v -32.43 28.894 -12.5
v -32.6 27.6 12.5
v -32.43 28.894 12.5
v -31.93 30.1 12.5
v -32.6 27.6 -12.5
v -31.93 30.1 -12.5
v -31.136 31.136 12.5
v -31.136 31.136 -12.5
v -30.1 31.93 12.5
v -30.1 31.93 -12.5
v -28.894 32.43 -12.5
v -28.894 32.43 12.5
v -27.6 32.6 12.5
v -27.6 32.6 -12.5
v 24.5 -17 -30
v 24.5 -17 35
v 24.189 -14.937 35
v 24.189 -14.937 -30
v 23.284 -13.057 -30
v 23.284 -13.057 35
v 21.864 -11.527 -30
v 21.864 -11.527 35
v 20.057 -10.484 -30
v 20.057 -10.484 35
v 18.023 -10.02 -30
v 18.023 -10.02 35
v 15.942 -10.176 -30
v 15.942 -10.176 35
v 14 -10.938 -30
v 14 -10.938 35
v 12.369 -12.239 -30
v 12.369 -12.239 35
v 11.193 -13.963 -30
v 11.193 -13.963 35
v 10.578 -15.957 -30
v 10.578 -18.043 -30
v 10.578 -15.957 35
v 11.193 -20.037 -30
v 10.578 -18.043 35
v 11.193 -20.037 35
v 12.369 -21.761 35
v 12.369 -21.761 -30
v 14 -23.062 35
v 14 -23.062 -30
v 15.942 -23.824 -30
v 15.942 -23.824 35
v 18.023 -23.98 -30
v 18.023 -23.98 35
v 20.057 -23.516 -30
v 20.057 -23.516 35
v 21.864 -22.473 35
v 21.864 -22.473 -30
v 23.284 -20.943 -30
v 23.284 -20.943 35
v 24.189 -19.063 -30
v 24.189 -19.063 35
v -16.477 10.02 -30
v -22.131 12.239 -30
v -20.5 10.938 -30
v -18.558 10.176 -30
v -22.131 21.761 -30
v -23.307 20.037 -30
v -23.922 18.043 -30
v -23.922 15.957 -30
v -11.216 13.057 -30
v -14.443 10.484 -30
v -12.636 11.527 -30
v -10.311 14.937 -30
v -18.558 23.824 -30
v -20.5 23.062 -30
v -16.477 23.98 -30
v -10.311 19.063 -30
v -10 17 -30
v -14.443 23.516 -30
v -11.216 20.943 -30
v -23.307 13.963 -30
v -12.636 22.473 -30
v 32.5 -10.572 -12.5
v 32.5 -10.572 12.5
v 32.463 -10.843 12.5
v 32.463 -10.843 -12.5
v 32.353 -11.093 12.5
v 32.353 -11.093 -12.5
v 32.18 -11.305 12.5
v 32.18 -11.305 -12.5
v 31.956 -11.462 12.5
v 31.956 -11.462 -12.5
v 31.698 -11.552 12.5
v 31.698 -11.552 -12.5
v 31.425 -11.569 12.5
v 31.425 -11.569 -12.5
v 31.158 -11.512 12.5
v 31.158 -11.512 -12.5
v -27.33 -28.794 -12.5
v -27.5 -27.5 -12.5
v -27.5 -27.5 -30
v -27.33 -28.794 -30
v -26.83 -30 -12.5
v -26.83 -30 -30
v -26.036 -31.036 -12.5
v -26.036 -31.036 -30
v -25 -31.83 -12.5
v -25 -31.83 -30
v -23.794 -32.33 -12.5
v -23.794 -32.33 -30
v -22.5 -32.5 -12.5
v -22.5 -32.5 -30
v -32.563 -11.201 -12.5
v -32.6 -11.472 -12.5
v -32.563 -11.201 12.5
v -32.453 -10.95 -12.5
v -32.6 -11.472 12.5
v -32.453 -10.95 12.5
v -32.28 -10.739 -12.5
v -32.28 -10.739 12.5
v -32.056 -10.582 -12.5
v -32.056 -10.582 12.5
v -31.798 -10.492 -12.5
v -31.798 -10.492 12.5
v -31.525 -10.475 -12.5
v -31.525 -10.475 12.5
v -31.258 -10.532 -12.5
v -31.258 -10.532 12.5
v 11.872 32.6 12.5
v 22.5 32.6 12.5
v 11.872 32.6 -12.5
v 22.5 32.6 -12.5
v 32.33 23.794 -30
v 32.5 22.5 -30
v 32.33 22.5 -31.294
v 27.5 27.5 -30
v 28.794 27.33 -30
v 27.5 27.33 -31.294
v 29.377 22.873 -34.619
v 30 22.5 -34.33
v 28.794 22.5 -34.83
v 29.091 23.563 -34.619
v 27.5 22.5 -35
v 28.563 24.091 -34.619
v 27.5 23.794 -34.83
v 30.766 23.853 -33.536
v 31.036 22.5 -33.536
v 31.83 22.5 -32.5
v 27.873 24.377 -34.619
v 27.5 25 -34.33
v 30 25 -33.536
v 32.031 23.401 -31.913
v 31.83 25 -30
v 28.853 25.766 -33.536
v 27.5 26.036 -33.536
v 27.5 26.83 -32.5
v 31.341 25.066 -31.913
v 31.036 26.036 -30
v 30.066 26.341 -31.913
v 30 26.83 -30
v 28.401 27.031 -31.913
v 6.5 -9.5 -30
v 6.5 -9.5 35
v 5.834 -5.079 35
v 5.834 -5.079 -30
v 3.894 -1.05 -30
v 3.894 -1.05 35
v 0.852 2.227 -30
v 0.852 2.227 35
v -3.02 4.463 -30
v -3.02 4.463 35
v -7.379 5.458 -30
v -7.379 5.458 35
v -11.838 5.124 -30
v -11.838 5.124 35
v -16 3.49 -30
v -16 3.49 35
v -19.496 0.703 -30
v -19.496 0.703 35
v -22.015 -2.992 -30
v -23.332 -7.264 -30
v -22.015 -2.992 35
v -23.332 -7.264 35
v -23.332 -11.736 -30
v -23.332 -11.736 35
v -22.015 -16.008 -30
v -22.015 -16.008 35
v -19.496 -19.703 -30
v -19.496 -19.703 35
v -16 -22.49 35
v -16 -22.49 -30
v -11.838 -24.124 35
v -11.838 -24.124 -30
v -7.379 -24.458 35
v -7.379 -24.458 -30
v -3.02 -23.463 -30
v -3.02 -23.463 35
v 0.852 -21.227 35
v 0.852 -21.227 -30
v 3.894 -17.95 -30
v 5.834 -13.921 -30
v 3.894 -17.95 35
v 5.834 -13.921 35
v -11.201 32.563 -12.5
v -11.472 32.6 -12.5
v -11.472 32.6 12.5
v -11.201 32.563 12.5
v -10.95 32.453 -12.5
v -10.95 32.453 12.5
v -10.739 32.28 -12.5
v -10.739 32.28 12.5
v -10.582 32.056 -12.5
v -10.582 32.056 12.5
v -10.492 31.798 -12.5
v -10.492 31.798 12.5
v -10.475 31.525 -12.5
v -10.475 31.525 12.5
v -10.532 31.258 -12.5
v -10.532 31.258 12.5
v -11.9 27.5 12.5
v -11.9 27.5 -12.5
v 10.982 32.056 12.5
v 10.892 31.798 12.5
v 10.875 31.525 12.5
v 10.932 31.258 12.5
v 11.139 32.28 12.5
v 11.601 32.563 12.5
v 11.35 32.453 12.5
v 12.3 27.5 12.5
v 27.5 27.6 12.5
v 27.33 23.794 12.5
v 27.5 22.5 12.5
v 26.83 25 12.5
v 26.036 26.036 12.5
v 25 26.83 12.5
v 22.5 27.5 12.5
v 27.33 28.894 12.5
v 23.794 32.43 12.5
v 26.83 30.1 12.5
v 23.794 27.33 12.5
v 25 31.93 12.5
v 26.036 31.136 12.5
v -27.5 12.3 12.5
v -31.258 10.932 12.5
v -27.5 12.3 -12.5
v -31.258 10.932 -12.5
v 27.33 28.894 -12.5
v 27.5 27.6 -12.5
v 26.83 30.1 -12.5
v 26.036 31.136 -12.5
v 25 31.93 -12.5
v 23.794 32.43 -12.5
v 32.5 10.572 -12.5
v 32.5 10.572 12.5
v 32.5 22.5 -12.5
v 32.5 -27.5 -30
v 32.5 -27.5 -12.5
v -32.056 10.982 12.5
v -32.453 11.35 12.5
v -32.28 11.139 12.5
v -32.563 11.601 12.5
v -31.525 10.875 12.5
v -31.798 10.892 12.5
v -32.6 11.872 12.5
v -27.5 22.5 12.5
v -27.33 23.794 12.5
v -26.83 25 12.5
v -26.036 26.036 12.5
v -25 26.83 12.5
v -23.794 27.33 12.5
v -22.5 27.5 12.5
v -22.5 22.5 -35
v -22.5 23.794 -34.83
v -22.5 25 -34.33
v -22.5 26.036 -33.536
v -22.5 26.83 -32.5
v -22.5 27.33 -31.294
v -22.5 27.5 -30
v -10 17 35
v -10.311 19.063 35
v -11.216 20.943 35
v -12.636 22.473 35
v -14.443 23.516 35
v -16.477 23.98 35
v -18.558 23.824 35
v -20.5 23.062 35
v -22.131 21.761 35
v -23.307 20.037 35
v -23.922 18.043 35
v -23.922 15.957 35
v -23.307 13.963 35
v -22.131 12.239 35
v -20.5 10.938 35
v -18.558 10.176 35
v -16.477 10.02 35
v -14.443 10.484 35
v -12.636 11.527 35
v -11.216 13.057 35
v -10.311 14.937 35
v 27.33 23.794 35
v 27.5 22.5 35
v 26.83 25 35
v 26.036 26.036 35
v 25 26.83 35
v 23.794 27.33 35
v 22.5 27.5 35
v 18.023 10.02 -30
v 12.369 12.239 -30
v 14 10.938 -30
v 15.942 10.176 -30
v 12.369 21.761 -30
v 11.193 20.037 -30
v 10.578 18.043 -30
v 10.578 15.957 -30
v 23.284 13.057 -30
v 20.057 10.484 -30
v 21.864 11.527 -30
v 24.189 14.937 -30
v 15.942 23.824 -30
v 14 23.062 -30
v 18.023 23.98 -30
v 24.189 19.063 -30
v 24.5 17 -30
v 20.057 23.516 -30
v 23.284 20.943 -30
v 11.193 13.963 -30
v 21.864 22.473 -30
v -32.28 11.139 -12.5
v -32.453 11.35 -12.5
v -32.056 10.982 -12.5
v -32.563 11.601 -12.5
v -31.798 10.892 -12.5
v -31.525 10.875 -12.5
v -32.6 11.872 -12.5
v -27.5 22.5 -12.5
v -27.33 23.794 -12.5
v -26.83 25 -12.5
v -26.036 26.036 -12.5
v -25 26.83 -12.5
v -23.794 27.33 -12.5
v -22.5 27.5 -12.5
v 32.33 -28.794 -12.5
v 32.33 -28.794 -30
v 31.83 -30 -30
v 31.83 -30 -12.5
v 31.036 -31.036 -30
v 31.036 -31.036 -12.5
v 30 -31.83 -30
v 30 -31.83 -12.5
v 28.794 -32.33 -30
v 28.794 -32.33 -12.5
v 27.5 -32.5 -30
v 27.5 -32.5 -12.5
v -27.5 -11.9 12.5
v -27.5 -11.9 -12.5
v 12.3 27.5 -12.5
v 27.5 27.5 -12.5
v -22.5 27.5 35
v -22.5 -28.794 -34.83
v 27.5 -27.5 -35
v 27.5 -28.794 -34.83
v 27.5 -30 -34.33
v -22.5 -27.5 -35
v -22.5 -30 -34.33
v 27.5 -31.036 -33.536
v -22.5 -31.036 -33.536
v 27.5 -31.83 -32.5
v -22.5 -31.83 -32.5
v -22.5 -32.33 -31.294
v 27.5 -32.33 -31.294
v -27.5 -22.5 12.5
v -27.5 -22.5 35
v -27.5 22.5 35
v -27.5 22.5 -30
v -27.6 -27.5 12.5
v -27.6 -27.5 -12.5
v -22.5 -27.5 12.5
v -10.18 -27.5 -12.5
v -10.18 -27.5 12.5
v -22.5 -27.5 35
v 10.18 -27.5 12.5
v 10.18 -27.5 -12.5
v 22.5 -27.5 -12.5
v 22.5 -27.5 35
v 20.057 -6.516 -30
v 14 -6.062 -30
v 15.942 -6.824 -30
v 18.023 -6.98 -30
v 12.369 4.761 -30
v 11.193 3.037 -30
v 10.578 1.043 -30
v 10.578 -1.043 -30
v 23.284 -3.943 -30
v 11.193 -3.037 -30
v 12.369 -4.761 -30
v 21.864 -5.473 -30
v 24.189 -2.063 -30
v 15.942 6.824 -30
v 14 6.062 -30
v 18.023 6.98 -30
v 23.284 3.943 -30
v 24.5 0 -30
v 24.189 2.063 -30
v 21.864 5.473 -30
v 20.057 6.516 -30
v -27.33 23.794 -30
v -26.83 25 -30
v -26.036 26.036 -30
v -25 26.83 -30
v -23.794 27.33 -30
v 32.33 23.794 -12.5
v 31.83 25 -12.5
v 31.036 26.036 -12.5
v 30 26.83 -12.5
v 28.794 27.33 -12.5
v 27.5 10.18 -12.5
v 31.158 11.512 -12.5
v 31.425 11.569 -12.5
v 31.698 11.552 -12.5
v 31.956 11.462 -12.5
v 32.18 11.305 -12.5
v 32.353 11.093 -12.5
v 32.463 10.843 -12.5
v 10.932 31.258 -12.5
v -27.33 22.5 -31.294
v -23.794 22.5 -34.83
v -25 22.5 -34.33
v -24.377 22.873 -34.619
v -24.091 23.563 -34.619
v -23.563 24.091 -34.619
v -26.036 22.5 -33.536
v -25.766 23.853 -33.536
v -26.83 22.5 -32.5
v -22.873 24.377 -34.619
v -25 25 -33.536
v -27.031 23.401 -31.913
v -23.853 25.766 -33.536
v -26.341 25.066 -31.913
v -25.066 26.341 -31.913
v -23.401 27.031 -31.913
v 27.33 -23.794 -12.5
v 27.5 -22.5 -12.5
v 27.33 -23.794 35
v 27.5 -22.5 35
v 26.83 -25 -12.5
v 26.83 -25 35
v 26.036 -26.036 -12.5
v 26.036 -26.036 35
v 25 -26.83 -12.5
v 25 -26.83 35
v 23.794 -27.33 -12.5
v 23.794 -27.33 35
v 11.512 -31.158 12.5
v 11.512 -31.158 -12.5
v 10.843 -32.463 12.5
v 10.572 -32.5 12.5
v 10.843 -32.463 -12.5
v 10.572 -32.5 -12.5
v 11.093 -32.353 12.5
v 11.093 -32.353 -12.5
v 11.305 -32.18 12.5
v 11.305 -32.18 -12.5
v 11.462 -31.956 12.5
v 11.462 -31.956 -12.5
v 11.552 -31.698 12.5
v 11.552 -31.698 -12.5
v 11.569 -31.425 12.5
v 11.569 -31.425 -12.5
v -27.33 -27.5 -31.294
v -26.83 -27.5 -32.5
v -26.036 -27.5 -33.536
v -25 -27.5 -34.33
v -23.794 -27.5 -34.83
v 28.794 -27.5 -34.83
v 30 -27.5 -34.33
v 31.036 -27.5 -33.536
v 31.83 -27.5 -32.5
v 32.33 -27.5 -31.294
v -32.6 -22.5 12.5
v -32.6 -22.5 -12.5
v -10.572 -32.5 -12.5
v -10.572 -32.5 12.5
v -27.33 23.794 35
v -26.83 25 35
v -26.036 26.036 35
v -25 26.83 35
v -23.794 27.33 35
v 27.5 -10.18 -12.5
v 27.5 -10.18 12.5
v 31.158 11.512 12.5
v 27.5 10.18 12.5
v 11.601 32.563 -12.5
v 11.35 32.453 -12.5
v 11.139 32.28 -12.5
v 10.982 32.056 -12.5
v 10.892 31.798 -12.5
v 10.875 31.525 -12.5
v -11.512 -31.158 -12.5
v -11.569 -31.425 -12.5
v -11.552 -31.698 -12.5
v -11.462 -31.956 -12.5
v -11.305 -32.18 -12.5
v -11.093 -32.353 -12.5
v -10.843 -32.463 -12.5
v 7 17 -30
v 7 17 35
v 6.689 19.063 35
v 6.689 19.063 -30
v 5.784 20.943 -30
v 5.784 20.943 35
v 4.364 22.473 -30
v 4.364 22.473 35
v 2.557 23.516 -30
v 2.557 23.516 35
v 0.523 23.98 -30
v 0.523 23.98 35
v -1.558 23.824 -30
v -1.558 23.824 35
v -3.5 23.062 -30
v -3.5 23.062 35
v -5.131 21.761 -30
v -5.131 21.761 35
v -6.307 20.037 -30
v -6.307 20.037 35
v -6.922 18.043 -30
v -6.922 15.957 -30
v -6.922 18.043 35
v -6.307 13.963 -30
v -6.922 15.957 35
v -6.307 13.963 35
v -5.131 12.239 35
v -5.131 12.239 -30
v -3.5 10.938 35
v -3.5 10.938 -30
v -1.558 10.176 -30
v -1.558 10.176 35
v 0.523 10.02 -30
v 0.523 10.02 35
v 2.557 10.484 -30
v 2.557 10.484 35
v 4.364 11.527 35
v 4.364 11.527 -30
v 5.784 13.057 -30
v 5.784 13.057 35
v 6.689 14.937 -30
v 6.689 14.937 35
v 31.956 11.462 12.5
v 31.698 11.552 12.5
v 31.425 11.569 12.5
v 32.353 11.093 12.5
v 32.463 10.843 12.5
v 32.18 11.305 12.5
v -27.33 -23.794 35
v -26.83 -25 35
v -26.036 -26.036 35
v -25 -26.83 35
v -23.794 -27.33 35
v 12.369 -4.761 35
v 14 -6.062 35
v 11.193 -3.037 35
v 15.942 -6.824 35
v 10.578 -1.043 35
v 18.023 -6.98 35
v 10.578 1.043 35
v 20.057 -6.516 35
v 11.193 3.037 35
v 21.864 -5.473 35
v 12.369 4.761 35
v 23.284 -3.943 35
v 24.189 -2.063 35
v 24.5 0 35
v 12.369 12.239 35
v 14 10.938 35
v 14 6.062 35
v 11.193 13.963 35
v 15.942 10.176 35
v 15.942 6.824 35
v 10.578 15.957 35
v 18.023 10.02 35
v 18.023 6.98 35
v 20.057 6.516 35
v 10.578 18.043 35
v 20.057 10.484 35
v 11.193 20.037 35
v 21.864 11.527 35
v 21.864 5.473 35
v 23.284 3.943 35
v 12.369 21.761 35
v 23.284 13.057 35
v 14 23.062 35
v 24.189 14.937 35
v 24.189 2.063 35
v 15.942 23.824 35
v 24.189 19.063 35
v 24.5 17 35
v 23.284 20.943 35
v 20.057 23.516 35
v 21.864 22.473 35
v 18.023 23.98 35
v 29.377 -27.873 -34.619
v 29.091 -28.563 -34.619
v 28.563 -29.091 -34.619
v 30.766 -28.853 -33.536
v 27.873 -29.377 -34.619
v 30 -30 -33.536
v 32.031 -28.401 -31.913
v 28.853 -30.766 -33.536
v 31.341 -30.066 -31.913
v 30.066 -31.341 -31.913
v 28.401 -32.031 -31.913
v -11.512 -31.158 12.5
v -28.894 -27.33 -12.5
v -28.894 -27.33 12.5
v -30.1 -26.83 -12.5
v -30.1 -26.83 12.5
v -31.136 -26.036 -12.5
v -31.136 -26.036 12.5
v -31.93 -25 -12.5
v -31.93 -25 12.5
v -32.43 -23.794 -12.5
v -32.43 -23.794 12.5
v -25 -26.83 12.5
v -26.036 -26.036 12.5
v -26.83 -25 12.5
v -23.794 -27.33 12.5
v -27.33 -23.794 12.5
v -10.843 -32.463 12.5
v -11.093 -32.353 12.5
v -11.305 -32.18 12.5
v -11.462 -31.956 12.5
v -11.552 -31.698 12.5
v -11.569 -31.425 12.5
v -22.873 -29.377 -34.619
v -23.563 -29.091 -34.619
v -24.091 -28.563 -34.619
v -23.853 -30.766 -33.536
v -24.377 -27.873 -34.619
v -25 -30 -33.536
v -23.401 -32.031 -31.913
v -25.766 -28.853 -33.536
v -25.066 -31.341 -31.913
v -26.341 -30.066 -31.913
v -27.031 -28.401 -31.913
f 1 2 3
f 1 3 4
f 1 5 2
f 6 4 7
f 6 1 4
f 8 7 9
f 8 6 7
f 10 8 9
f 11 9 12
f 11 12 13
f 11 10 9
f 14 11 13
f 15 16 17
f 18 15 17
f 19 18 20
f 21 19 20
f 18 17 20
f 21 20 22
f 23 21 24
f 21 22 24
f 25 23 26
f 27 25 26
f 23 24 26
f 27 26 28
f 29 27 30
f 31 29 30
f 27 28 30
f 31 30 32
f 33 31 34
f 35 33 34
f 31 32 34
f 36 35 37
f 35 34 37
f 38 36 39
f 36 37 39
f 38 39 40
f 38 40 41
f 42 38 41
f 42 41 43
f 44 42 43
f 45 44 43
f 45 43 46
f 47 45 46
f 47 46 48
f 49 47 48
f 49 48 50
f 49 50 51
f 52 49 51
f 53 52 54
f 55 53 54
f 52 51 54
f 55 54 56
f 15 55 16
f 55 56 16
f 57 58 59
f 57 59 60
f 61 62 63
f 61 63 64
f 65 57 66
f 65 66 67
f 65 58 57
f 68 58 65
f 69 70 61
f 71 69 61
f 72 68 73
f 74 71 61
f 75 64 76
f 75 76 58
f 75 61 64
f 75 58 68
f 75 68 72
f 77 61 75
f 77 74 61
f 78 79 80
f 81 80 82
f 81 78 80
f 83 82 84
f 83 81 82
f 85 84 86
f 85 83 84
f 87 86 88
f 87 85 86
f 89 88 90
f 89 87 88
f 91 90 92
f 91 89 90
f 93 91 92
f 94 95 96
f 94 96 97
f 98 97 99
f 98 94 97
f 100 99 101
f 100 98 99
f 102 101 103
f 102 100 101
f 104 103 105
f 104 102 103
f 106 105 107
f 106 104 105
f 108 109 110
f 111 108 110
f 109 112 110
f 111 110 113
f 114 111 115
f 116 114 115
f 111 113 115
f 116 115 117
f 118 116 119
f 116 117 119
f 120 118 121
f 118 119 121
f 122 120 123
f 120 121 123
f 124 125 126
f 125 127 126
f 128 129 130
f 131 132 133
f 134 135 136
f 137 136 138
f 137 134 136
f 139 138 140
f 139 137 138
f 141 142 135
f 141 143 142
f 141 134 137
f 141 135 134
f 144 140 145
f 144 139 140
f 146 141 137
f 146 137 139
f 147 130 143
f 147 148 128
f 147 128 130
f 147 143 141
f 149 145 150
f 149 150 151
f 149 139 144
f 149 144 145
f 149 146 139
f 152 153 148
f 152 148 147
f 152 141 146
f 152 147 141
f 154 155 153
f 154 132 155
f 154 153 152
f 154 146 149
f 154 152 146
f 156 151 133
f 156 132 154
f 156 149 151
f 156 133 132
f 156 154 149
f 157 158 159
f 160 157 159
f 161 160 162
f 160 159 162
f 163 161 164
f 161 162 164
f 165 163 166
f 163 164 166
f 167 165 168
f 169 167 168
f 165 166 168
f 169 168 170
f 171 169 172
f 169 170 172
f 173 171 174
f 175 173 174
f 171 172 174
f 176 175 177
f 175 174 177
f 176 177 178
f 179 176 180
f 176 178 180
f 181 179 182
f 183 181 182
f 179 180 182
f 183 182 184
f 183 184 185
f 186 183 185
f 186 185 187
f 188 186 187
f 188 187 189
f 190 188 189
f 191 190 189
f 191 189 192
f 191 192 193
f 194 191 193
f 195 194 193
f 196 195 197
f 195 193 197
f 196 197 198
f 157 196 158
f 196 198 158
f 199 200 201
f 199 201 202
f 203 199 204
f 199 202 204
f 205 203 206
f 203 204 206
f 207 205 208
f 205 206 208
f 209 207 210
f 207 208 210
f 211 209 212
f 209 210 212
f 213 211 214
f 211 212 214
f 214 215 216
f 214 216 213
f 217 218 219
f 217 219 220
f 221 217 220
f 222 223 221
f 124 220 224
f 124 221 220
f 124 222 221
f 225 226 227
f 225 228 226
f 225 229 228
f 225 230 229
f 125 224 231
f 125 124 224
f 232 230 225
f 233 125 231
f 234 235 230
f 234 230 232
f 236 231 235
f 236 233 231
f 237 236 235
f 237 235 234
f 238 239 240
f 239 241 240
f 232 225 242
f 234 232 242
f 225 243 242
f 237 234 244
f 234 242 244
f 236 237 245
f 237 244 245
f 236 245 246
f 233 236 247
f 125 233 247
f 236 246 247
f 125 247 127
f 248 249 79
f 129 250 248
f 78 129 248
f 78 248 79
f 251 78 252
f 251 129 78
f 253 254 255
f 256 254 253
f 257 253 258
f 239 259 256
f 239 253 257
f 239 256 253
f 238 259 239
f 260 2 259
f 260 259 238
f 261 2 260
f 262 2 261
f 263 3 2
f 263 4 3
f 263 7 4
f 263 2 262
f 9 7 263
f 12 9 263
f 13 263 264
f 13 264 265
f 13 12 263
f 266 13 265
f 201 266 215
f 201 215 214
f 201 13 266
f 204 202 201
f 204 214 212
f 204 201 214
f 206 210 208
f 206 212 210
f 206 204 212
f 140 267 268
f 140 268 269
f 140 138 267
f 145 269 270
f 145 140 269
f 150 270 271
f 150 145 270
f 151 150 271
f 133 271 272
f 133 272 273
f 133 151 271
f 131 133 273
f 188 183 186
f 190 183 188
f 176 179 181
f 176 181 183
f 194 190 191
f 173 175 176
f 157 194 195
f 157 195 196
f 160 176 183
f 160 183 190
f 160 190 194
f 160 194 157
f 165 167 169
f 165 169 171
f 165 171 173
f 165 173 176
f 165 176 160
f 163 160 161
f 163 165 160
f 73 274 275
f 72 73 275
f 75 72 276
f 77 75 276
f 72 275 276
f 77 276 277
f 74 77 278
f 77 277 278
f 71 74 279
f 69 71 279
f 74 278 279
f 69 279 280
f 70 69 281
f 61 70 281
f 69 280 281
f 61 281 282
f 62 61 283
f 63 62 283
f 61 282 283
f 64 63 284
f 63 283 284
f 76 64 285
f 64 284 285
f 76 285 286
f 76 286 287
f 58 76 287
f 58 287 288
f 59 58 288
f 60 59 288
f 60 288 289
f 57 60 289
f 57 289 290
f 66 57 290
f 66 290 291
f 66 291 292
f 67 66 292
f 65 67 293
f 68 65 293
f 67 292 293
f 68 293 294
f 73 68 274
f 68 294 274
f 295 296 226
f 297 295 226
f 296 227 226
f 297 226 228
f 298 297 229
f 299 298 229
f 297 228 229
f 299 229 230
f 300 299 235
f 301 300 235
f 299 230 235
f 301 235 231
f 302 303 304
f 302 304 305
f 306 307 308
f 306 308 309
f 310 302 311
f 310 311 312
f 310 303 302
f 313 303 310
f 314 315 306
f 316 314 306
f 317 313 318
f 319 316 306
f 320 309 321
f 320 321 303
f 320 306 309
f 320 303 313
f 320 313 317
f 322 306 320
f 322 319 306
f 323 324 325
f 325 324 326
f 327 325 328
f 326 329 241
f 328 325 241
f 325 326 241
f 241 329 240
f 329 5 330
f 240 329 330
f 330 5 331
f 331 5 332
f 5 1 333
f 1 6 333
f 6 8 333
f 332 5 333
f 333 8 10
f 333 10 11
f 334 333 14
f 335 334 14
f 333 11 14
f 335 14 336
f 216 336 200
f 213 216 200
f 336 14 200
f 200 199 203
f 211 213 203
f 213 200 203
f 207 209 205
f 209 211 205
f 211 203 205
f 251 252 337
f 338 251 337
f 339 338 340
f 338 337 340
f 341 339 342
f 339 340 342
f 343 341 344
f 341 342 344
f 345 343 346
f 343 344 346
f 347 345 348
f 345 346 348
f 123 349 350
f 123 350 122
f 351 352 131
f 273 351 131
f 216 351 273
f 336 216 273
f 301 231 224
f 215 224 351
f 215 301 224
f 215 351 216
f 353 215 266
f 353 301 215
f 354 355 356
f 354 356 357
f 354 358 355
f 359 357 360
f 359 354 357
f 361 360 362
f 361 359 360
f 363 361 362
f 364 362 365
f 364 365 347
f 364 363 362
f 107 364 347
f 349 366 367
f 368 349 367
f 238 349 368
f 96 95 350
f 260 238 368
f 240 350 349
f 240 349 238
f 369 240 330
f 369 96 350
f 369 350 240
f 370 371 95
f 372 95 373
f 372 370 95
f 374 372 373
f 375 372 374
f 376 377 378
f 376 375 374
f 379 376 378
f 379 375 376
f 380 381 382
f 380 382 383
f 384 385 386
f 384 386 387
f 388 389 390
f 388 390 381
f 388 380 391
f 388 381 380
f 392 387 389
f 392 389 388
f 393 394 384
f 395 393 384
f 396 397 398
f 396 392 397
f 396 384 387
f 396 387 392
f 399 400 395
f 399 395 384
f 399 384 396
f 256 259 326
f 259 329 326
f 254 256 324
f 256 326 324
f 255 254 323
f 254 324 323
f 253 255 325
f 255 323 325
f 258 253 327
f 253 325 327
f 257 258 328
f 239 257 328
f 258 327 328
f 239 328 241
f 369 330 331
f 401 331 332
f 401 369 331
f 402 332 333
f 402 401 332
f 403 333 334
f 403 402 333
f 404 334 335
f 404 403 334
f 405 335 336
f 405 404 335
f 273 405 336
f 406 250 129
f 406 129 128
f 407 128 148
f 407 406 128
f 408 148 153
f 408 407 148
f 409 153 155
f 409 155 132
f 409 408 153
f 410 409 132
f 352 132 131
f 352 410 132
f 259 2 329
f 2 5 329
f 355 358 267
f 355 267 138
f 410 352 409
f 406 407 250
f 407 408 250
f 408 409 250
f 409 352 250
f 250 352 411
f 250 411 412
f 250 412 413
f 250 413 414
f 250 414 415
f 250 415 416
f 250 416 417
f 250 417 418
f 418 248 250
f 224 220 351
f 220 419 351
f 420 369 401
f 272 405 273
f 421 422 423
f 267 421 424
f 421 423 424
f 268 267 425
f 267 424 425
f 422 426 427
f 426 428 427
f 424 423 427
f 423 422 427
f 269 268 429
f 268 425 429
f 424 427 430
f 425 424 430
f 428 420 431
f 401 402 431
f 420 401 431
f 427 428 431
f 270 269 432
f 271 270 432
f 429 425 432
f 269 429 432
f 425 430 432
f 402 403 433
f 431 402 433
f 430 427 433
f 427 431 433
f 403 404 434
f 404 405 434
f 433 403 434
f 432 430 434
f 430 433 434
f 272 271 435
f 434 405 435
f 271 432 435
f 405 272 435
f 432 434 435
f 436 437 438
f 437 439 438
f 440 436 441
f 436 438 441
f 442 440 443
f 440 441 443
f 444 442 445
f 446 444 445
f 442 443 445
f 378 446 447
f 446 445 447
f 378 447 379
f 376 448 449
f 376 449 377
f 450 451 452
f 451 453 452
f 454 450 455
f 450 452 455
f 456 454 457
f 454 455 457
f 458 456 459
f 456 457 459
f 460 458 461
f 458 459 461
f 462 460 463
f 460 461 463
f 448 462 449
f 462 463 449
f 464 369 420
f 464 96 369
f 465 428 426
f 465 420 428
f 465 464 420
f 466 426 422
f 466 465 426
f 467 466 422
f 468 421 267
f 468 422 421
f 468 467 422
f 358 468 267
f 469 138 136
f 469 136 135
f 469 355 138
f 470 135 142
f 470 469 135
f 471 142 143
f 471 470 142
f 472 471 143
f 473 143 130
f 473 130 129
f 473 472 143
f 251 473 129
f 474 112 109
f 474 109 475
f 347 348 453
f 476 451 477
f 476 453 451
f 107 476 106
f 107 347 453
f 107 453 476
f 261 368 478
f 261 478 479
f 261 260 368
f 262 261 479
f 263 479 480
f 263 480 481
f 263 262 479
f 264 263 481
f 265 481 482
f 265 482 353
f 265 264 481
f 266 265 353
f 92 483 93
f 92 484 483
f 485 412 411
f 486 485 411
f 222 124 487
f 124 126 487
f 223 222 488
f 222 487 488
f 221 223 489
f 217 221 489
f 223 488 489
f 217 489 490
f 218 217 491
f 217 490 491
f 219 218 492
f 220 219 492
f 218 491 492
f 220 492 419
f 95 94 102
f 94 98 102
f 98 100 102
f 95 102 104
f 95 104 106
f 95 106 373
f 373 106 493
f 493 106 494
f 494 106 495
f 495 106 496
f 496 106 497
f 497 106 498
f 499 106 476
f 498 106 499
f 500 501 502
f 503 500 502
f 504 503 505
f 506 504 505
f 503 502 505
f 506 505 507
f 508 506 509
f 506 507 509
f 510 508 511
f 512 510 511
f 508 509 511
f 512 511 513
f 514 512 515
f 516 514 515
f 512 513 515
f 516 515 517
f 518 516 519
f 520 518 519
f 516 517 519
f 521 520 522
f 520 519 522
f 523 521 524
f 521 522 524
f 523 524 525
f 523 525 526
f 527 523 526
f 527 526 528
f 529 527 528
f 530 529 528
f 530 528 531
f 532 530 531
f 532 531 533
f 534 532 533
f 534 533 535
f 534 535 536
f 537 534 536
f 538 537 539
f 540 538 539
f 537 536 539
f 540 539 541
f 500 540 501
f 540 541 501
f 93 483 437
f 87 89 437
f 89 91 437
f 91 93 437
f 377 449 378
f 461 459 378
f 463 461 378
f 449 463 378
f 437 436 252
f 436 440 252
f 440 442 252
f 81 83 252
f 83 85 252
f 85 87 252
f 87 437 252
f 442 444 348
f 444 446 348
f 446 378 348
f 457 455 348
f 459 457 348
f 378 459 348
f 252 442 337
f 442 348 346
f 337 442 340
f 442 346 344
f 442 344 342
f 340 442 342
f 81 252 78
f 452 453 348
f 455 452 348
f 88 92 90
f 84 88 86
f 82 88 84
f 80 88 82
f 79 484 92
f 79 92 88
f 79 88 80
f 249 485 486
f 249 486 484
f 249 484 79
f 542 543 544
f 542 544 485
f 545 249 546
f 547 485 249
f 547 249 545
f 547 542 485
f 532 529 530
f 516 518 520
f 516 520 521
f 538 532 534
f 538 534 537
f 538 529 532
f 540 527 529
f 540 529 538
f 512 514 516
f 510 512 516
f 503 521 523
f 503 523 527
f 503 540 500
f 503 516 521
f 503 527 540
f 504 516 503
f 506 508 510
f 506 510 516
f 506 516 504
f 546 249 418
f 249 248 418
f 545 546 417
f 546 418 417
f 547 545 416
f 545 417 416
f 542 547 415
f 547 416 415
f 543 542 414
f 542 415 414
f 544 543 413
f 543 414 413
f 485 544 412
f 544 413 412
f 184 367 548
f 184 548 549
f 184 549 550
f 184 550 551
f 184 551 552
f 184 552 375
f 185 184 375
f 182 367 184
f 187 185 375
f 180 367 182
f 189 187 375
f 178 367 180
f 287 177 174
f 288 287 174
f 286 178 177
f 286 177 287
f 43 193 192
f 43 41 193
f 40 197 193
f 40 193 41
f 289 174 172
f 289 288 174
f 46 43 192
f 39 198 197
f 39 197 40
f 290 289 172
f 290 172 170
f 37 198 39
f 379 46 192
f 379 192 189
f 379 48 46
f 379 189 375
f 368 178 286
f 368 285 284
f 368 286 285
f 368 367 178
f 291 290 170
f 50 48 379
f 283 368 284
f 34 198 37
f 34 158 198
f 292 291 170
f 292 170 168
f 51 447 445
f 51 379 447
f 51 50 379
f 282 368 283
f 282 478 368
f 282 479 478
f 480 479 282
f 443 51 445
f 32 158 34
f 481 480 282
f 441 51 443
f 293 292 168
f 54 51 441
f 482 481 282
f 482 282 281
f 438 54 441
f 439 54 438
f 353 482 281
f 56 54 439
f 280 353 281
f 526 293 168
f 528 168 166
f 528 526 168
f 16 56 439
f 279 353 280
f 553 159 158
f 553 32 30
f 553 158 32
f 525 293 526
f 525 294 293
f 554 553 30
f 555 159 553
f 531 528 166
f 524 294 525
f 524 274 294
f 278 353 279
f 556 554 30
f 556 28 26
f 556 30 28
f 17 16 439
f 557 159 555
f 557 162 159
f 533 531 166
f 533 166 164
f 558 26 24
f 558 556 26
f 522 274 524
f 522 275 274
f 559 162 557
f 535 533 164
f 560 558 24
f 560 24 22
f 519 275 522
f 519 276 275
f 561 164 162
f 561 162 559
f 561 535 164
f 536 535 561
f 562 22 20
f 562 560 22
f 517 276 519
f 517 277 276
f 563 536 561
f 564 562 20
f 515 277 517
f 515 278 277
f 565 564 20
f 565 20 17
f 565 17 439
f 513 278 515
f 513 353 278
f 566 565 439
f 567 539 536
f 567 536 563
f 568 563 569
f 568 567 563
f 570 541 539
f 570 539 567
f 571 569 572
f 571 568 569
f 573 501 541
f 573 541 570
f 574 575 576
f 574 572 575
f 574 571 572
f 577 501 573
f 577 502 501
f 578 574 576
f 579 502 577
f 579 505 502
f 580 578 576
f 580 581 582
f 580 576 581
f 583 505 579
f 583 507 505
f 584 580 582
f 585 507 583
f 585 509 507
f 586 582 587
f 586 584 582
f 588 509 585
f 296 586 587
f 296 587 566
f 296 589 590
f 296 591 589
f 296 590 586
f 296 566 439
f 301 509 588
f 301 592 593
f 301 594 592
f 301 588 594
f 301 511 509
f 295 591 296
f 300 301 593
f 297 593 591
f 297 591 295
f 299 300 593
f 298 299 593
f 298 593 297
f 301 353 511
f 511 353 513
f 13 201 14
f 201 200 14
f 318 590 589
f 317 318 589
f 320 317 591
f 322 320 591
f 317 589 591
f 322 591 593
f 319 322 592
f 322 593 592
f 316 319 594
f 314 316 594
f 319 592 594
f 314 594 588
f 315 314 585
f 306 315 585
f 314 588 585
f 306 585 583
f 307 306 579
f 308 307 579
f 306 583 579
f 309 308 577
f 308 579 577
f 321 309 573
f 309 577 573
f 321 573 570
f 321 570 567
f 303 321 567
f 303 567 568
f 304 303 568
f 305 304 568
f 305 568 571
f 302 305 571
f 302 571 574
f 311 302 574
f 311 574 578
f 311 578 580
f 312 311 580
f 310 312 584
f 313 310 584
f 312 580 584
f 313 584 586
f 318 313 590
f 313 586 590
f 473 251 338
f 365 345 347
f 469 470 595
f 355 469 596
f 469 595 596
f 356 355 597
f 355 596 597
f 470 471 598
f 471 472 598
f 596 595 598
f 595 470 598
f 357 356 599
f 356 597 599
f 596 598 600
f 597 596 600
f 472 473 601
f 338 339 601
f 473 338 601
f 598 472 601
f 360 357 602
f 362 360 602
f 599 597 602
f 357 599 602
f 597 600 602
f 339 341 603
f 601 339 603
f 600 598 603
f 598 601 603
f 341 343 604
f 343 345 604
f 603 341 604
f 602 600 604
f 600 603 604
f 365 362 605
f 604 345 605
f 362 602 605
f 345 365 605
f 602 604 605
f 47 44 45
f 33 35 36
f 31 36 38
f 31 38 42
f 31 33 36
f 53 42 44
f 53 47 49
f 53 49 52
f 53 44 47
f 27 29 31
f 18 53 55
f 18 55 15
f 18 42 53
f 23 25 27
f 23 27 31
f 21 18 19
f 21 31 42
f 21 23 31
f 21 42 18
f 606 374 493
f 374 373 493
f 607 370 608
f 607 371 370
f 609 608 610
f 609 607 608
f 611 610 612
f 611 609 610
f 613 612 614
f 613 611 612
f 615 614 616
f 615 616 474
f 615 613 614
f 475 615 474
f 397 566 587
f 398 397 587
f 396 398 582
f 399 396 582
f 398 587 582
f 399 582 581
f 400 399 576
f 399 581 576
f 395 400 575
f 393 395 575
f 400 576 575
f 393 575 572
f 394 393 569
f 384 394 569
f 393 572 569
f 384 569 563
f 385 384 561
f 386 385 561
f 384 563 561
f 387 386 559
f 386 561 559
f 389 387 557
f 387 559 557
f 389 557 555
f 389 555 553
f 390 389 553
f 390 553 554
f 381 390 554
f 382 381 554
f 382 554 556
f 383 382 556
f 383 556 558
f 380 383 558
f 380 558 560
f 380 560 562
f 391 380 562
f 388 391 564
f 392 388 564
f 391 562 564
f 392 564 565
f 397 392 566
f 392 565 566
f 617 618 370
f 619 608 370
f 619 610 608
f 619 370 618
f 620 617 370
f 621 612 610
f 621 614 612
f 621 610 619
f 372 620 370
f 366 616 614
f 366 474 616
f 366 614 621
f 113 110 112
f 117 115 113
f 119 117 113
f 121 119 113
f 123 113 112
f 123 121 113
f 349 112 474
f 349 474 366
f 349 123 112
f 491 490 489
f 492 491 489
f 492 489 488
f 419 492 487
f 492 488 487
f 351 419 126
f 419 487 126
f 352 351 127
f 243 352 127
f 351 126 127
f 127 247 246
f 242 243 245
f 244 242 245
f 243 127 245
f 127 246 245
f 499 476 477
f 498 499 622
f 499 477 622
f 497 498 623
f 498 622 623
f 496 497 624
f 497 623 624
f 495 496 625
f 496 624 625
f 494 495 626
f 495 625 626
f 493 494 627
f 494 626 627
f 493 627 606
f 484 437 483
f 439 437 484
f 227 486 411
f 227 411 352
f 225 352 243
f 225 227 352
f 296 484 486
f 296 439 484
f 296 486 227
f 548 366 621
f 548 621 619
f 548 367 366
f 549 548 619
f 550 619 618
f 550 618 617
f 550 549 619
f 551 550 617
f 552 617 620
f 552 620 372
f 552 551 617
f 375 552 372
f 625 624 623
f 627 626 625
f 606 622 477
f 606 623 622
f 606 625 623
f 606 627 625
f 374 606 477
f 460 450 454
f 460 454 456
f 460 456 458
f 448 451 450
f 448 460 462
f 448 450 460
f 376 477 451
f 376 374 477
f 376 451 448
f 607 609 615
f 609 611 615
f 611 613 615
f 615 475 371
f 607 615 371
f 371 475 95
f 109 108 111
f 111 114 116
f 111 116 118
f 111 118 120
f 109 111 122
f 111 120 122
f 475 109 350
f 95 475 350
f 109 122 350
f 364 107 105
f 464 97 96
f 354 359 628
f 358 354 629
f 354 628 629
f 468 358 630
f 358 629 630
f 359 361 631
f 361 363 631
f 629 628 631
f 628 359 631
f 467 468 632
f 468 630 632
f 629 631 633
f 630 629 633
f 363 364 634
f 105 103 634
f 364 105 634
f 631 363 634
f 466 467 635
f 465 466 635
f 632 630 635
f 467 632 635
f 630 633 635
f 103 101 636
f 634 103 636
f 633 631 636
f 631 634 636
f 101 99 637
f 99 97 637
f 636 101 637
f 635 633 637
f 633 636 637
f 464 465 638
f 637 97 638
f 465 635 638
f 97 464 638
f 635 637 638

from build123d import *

# Parameters (mm, degrees)
F1_DEPTH = 35
F0_W     = 5.1
F0_H     = 5.1
F2_DEPTH = 12.5
F4_DEPTH = 22.5
F5_R     = 5
F6_R     = 1
F7_R     = 7
F7_R_2   = 15
F8_DEPTH = 65


with BuildPart() as f1:
    # F0 (on Top) → F1 (new body, symmetric)
    with BuildSketch(Plane.XY):
        Polygon((-11.9, 27.5), (-27.5, 27.5), (-27.5, 12.3), (-27.5, -11.9), (-27.5, -27.5), (-10.1801488287, -27.5), (10.1801488287, -27.5), (27.5, -27.5), (27.5, -10.1801488287), (27.5, 10.1801488287), (27.5, 27.5), (12.3, 27.5), align=None)
    extrude(amount=F1_DEPTH, both=True)

    # F0 (on Top) → F2 (join, symmetric)
    with BuildSketch(Plane.XY):
        Polygon((-27.5, 12.3), (-27.5, 27.5), (-32.6, 27.5), (-32.6, 10.4437518052), align=None)
        Polygon((-27.5, -27.5), (-27.5, -11.9), (-32.6, -10.0437518052), (-32.6, -27.5), align=None)
        Polygon((-27.5, 32.6), (-27.5, 27.5), (-11.9, 27.5), (-10.0437518052, 32.6), align=None)
        Polygon((10.4437518052, 32.6), (12.3, 27.5), (27.5, 27.5), (27.5, 32.6), align=None)
        Polygon((10.1801488287, -27.5), (-10.1801488287, -27.5), (-12, -32.5), (12, -32.5), align=None)
        Polygon((32.5, 12), (27.5, 10.1801488287), (27.5, -10.1801488287), (32.5, -12), align=None)
        with Locations((-30.05, 30.05)):
            Rectangle(F0_W, F0_H)
    extrude(amount=F2_DEPTH, both=True)

    # F3 (on face) → F4 (join, through all)
    with BuildSketch(Plane(origin=(0, 0, -35), x_dir=(1, 0, 0), z_dir=(0, 0, -1))):
        Polygon((-27.5, 32.5), (-27.5, 27.5), (27.5, 27.5), (27.5, -27.5), (32.5, -27.5), (32.5, 32.5), align=None)
    extrude(amount=-F4_DEPTH)

    # F5
    f5_edges = [f1.edges().sort_by_distance(p)[0] for p in [
        (-32.6, 32.6, 0),
        (-27.5, 27.5, 23.75),
        (-27.5, 27.5, -23.75),
        (-32.6, -27.5, 0),
        (-27.5, -32.5, -23.75),
        (32.5, -32.5, -23.75),
        (27.5, -27.5, 11.25),
        (32.5, 27.5, -23.75),
        (27.5, 32.6, 0),
        (27.5, 27.5, 23.75),
        (32.5, -2.5, -35),
        (2.5, -32.5, -35),
        (-27.5, -2.5, -35),
        (2.5, 27.5, -35),
        (-27.5, -27.5, 23.75),
    ]]
    fillet(f5_edges, radius=F5_R)

    # F6
    f6_edges = [f1.edges().sort_by_distance(p)[0] for p in [
        (12, -32.5, 0),
        (-12, -32.5, 0),
        (32.5, -12, 0),
        (32.5, 12, 0),
        (10.443752, 32.6, 0),
        (-10.043752, 32.6, 0),
        (-32.6, 10.443752, 0),
        (-32.6, -10.043752, 0),
    ]]
    fillet(f6_edges, radius=F6_R)

    # F7 (on face) → F8 (cut)
    with BuildSketch(Plane.XY.offset(35)):
        with Locations((17.5, 17)):
            Circle(F7_R)
        with Locations((17.5, 0)):
            Circle(F7_R)
        with Locations((17.5, -17)):
            Circle(F7_R)
        with Locations((-17, 17)):
            Circle(F7_R)
        with Locations((0, 17)):
            Circle(F7_R)
        with Locations((-8.5, -9.5)):
            Circle(F7_R_2)
    extrude(amount=-F8_DEPTH, mode=Mode.SUBTRACT)


solid = f1.part
